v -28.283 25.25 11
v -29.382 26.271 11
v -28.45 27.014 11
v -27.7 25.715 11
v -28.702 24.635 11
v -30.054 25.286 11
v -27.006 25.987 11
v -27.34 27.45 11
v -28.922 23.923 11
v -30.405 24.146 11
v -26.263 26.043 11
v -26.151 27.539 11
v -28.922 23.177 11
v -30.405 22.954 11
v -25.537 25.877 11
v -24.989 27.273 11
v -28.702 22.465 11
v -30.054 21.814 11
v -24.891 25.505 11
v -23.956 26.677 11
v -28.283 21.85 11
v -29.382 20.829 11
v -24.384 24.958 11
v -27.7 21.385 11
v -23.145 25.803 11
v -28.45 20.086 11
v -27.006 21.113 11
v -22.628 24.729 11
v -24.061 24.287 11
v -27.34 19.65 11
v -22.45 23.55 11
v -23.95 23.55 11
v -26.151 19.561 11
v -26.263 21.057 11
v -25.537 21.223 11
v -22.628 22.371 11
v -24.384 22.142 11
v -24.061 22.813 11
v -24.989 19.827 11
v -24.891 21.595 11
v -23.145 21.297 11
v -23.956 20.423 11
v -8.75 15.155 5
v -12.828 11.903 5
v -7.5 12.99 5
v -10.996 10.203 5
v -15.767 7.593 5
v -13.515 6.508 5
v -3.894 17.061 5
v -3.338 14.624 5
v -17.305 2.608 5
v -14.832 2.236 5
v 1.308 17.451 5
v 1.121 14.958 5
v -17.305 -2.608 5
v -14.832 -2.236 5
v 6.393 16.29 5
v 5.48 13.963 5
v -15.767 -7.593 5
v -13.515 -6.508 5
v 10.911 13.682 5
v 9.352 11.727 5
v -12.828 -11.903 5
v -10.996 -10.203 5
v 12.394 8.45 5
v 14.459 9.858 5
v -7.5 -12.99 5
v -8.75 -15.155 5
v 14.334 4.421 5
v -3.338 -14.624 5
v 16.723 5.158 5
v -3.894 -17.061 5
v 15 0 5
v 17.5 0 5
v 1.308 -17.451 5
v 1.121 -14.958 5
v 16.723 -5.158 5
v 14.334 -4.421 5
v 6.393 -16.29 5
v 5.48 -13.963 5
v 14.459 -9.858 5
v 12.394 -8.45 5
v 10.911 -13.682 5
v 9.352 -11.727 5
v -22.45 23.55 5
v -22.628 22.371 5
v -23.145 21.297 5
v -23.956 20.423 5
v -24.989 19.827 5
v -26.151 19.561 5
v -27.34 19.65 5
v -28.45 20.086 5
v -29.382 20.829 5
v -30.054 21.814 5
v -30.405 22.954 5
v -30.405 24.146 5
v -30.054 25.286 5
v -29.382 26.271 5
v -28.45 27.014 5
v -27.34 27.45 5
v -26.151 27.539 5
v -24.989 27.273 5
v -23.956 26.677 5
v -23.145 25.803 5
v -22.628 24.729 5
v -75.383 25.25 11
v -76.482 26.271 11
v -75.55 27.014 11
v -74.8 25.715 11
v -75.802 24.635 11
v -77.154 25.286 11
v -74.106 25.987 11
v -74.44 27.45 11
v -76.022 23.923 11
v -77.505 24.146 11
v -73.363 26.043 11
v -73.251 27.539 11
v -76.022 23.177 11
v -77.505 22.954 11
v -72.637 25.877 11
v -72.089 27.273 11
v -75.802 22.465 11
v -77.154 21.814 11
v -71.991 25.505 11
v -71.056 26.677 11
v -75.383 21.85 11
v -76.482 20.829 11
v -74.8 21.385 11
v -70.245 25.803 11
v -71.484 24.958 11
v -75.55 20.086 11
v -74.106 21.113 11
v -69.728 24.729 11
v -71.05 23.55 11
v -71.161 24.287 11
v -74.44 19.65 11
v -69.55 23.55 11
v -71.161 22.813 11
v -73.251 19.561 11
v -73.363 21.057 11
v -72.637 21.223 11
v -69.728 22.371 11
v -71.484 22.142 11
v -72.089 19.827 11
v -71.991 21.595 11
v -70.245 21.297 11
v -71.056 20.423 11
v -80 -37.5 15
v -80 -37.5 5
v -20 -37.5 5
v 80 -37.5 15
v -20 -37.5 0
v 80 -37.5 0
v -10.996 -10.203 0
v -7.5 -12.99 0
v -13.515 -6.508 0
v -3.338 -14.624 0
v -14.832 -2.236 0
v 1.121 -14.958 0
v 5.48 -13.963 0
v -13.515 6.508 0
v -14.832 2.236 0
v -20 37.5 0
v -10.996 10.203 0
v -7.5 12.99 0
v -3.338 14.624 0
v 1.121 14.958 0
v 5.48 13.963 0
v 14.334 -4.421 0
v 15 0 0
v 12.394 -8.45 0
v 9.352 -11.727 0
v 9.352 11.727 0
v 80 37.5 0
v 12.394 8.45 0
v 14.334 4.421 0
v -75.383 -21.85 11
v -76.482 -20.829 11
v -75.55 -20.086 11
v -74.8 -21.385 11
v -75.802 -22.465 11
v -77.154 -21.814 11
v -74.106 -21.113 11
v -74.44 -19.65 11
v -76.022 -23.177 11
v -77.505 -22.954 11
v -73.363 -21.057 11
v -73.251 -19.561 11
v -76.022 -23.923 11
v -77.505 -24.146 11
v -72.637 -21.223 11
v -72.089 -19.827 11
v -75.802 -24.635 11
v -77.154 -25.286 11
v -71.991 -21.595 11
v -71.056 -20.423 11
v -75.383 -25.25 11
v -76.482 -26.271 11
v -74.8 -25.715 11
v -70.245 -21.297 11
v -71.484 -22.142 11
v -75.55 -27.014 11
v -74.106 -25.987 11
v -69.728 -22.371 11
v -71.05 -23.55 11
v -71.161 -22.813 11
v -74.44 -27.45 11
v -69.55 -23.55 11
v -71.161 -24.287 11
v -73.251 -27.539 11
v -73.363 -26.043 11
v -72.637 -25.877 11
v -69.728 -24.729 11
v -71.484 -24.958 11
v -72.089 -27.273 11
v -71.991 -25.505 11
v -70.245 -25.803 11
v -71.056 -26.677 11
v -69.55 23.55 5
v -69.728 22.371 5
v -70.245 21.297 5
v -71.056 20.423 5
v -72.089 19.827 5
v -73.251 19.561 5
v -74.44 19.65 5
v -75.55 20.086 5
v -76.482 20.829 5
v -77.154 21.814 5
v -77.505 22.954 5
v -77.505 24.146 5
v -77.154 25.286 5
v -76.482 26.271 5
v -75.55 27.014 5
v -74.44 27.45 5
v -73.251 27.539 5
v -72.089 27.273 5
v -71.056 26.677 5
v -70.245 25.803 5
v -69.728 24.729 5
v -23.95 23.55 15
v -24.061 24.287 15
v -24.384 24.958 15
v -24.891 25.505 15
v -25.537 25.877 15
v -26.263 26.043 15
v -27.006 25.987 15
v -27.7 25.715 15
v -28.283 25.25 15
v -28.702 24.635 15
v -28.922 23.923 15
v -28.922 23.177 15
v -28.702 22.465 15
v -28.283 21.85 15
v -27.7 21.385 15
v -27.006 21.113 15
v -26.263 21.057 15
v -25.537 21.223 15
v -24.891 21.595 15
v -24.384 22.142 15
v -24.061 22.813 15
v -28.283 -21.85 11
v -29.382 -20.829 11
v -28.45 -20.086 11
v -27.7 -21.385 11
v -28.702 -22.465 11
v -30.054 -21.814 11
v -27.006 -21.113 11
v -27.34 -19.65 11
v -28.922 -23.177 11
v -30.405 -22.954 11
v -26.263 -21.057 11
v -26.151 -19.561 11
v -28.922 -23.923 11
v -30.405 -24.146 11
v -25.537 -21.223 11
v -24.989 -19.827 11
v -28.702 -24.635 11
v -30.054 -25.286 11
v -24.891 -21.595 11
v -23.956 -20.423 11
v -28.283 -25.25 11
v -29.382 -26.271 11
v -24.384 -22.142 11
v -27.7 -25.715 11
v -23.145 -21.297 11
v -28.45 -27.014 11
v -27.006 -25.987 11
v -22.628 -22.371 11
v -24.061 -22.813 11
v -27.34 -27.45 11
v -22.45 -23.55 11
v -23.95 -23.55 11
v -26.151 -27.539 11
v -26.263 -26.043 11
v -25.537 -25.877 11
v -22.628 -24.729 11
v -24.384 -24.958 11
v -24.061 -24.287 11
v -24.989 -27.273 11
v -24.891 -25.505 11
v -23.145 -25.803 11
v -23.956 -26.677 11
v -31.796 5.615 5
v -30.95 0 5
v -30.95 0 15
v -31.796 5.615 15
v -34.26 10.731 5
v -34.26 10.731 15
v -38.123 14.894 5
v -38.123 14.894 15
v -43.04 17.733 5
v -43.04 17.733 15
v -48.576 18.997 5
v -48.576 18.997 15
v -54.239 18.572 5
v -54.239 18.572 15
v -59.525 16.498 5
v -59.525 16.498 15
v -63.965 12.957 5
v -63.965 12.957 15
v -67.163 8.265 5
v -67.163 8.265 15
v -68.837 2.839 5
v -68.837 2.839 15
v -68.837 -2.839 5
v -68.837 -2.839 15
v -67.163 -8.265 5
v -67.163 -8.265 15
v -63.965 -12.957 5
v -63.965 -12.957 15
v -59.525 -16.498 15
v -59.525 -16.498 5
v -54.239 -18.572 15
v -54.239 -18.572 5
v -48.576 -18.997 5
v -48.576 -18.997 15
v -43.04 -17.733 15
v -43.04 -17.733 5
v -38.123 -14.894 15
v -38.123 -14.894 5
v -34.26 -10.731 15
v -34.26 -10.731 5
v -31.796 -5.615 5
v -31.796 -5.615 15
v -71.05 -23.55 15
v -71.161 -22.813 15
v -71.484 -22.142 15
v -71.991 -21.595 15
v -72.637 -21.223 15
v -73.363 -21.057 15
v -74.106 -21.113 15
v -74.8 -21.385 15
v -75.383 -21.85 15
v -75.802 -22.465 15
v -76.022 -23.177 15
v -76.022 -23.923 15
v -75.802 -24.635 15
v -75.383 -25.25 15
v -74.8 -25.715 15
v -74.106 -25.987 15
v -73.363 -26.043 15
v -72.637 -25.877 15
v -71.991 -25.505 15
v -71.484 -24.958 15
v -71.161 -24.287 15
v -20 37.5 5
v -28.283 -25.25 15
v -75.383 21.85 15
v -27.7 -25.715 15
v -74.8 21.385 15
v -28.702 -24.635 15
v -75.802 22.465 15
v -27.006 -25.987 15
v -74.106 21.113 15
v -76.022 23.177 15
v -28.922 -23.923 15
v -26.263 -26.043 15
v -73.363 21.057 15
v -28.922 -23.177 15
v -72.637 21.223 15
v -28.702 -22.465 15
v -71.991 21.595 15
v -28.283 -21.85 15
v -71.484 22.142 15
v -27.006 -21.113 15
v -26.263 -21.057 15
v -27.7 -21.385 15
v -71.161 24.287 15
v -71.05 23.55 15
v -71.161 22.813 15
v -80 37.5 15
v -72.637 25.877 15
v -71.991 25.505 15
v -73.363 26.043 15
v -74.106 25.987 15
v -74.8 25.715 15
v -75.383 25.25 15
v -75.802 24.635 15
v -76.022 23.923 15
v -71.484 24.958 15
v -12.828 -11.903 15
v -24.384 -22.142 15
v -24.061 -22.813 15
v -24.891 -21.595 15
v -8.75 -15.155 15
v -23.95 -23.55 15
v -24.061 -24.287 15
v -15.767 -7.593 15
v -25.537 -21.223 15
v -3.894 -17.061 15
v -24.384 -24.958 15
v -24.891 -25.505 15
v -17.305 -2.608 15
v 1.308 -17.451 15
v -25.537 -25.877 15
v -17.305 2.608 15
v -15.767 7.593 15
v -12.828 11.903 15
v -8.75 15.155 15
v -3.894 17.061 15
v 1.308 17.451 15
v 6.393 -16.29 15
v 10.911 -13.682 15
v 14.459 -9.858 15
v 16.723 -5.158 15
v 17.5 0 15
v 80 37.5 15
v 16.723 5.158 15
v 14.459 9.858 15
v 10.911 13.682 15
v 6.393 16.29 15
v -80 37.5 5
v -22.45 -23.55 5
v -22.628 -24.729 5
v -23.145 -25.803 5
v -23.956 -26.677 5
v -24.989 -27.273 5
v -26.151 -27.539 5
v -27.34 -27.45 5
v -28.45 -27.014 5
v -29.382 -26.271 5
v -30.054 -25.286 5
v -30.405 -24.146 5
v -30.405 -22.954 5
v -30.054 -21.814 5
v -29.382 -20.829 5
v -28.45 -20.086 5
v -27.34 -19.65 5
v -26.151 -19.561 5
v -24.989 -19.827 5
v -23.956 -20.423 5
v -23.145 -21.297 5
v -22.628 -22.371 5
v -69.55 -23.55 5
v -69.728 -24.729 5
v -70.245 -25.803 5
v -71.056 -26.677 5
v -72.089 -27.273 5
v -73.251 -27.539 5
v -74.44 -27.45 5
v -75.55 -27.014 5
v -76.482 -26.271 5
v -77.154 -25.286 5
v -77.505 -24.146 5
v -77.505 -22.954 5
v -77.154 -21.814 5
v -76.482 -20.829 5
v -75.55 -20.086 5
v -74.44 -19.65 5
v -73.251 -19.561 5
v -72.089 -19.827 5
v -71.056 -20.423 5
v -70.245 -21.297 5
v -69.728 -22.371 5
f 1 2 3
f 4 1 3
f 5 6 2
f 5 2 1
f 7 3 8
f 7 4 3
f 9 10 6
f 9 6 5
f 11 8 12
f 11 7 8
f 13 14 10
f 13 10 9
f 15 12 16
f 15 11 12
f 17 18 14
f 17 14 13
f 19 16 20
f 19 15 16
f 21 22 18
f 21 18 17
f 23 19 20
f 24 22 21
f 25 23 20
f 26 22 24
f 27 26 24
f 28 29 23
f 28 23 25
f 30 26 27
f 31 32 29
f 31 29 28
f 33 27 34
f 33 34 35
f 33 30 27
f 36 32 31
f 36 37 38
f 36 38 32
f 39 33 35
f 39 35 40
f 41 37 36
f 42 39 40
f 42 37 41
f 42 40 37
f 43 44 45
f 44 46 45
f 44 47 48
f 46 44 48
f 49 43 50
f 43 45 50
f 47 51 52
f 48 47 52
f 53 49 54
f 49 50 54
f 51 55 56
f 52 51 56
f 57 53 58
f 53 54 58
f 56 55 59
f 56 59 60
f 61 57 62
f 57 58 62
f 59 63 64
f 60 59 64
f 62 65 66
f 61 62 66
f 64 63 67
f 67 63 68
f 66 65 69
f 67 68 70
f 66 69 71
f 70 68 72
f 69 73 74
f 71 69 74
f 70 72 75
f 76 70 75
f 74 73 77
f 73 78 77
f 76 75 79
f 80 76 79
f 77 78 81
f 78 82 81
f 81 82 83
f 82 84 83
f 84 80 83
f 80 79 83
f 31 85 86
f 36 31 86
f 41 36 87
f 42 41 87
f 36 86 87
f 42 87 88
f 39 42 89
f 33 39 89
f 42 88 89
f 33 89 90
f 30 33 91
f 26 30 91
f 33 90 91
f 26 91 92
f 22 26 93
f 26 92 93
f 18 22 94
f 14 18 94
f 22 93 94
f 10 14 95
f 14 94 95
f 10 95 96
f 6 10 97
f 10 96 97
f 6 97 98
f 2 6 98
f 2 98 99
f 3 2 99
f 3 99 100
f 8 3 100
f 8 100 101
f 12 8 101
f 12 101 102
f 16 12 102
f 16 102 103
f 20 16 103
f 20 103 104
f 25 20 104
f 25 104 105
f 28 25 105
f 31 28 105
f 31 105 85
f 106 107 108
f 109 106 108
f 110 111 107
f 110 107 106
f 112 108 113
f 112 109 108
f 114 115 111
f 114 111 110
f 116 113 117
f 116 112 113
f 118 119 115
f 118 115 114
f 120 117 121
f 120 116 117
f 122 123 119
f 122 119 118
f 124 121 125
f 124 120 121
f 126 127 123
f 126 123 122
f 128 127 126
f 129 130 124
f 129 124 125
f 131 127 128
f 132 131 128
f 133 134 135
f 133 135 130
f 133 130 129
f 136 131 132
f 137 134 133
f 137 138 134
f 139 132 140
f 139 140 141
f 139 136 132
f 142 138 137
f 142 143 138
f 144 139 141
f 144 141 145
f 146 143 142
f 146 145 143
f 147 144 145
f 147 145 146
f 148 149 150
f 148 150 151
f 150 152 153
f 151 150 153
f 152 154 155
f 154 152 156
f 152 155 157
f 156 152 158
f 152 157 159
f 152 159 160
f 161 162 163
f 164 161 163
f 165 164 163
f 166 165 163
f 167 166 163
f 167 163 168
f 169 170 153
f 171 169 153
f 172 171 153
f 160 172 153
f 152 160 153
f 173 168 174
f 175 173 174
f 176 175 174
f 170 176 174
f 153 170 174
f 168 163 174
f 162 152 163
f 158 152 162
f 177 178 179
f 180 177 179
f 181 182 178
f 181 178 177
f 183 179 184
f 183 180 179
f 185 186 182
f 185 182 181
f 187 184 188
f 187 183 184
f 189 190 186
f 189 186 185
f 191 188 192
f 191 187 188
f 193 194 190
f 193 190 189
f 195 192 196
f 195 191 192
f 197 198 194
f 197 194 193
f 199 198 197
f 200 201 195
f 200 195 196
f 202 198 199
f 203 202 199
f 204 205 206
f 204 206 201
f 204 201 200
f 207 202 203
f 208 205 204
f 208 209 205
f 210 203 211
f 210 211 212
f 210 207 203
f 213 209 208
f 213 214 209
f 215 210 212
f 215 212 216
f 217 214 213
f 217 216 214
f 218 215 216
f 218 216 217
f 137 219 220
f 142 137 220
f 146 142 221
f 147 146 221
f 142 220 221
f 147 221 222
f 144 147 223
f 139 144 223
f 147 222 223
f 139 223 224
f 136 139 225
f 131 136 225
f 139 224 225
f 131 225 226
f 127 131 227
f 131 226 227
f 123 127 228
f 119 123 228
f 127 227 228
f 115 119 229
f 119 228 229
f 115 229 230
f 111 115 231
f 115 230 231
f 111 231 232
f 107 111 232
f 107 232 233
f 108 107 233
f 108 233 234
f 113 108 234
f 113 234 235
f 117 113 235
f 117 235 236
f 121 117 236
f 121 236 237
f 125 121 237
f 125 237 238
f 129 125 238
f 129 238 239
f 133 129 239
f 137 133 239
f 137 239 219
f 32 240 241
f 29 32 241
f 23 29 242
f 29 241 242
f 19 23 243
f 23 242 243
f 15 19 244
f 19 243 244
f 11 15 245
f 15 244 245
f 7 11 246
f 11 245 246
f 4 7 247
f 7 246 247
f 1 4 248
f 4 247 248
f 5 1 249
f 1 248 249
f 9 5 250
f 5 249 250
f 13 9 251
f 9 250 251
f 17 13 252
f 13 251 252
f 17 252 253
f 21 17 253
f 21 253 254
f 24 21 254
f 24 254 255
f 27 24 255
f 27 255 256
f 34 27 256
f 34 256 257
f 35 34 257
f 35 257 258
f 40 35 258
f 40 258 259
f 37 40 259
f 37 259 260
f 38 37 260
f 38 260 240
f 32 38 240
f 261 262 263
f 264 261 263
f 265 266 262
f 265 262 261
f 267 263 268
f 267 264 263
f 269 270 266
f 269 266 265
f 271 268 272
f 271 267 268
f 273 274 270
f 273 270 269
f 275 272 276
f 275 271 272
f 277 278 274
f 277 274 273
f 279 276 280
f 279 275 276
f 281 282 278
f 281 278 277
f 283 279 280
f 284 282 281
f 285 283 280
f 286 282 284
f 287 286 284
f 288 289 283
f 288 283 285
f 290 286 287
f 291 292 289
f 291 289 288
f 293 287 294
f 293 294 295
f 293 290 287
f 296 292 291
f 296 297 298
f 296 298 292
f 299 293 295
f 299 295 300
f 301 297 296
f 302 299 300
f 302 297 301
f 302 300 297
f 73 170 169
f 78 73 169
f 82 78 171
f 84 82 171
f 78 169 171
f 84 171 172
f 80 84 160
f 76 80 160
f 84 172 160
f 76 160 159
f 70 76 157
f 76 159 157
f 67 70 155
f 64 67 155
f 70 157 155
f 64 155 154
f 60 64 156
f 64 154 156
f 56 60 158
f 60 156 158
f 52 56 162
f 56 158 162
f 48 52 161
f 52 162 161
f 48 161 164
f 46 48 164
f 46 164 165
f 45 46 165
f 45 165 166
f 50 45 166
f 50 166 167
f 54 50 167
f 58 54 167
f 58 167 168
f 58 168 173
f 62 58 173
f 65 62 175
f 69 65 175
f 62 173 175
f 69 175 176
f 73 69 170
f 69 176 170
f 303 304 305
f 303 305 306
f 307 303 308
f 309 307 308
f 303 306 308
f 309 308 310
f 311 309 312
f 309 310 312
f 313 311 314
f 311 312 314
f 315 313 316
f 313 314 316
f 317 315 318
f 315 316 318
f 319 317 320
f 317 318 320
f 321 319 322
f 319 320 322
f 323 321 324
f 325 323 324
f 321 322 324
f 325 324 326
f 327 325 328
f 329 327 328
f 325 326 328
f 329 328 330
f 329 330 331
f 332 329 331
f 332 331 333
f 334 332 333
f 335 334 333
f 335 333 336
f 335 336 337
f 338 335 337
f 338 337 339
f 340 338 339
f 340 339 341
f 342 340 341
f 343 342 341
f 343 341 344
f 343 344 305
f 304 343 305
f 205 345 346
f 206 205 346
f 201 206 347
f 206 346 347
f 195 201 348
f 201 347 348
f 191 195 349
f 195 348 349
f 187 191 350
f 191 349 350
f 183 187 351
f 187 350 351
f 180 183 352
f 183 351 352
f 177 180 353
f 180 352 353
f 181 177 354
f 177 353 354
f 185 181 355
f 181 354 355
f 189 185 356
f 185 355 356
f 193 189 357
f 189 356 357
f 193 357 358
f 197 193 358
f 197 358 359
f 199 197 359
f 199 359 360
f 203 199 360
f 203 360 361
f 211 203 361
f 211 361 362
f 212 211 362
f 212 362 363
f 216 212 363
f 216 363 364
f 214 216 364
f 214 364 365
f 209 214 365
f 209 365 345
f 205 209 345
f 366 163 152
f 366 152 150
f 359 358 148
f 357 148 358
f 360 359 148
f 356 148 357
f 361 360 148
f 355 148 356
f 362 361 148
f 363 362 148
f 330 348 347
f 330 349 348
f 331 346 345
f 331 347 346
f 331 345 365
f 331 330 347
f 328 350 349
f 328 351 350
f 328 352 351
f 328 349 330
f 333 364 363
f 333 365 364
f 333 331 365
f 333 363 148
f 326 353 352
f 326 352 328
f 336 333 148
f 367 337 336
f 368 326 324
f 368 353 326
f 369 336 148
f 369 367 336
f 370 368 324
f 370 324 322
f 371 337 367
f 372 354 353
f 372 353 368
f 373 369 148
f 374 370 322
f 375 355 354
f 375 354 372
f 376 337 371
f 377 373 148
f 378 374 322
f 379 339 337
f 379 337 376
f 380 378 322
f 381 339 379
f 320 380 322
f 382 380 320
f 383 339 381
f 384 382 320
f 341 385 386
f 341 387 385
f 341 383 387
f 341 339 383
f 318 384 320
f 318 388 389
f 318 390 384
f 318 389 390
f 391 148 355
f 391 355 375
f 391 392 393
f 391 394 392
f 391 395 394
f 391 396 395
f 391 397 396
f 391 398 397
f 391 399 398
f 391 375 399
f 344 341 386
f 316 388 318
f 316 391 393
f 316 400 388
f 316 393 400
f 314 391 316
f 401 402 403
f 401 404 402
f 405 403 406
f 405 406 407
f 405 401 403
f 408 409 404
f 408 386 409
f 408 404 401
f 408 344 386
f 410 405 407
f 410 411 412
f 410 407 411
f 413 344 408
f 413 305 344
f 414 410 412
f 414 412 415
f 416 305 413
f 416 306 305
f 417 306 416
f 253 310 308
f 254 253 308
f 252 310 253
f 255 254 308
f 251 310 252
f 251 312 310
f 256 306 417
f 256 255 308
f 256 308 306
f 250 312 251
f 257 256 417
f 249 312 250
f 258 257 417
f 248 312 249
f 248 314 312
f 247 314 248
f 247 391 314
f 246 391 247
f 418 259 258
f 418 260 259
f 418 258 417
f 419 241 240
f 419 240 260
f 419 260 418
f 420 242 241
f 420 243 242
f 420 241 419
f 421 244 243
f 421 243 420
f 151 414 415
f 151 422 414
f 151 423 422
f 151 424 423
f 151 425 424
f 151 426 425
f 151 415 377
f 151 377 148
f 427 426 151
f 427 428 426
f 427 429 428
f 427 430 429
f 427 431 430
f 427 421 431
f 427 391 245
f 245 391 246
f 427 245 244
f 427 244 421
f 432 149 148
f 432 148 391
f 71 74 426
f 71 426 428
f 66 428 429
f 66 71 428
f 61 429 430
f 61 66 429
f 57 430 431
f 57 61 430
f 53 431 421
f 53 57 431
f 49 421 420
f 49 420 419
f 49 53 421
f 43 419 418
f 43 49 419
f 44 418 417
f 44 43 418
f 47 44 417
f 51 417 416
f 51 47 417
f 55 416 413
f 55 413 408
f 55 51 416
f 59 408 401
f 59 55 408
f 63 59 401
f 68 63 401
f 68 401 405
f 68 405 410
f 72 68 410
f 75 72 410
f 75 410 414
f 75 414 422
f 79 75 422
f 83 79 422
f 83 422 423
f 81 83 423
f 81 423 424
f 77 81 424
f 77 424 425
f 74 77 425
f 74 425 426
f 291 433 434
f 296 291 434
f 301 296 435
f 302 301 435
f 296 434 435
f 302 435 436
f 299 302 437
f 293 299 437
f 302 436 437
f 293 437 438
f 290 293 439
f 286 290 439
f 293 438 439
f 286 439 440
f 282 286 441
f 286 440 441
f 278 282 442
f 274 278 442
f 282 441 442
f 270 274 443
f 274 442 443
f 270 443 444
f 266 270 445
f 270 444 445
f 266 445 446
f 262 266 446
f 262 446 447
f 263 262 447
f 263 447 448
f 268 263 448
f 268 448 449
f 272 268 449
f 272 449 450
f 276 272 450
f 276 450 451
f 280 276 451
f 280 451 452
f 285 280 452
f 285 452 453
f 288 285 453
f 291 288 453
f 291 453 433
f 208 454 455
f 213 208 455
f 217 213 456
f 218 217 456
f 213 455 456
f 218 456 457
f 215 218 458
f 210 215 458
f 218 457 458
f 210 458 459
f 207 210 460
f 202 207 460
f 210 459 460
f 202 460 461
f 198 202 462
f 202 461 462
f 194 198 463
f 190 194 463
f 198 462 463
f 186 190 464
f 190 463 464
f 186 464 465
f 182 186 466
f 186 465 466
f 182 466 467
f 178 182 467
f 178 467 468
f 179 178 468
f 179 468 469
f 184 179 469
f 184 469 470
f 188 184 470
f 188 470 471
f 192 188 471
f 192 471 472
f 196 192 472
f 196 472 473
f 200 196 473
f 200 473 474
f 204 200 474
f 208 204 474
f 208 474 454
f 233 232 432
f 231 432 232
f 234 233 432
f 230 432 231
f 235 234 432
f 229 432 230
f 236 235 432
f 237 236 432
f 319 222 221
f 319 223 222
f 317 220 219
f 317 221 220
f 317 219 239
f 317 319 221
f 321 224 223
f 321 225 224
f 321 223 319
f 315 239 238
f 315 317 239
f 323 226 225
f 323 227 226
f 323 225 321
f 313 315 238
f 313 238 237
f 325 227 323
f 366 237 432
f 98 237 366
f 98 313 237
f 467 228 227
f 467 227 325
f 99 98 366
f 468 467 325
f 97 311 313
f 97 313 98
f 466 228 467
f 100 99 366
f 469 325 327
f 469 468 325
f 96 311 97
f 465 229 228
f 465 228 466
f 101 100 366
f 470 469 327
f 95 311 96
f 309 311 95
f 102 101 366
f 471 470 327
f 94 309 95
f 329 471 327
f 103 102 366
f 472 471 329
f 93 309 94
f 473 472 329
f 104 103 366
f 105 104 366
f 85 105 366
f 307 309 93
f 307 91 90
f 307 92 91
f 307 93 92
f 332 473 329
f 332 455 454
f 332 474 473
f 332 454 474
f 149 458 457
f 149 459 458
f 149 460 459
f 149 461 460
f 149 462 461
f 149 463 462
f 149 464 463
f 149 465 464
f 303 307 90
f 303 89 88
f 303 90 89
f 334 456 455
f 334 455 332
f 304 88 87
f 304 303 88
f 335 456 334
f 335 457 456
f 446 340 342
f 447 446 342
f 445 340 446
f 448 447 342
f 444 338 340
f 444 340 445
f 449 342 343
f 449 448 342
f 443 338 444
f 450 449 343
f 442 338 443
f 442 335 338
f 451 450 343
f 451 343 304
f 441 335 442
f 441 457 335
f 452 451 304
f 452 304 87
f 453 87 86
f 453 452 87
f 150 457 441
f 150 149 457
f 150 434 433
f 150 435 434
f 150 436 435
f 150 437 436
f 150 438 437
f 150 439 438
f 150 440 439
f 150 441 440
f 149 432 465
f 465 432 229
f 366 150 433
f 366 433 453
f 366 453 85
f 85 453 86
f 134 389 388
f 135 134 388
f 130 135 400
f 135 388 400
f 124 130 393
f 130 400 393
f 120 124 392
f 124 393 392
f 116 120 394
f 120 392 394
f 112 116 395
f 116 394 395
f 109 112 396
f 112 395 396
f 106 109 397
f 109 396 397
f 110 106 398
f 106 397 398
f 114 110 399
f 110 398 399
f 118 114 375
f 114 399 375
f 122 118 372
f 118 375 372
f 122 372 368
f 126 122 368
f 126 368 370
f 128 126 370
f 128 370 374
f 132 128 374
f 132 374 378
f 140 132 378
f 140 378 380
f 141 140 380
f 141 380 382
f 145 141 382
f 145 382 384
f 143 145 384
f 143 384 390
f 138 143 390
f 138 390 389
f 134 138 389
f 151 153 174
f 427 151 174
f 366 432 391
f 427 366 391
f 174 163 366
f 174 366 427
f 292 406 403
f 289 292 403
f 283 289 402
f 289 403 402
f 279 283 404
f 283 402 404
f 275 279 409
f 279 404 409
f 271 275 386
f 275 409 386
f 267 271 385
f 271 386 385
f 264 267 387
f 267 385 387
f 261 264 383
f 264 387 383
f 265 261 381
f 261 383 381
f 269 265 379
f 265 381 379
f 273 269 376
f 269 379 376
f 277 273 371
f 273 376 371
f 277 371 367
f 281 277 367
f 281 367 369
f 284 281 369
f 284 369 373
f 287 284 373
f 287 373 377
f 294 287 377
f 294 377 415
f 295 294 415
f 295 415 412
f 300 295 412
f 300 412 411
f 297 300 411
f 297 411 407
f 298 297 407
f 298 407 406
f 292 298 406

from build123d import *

# Parameters (mm, degrees)
F0_W     = 160
F0_H     = 75
F0_R     = 17.5
F1_DEPTH = 15
F2_R     = 2.5
F2_R_2   = 19.05
F3_DEPTH = 25
F4_R     = 4
F5_DEPTH = 11
F6_W     = 60
F6_H     = 5
F7_DEPTH = 79.7
F8_R     = 19
F8_R_2   = 17.5
F8_R_3   = 15
F9_DEPTH = 5


# Not quite as in the source:
# - a feature names something its author has since deleted; it is built from what else it names


with BuildPart() as f1:
    # F0 (on Top) → F1 (new body)
    with BuildSketch(Plane.XY):
        Rectangle(F0_W, F0_H)
        Circle(F0_R, mode=Mode.SUBTRACT)
    extrude(amount=F1_DEPTH)

    # F2 (on face) → F3 (cut)
    with BuildSketch(Plane.XY.offset(15)):
        with Locations((-73.55, 23.55)):
            Circle(F2_R)
        with Locations((-26.45, 23.55)):
            Circle(F2_R)
        with Locations((-26.45, -23.55)):
            Circle(F2_R)
        with Locations((-73.55, -23.55)):
            Circle(F2_R)
        with Locations((-50, 0)):
            Circle(F2_R_2)
    extrude(amount=-F3_DEPTH, mode=Mode.SUBTRACT)

    # F4 (on face) → F5 (cut)
    with BuildSketch(Plane(origin=(0, 0, 0), x_dir=(1, 0, 0), z_dir=(0, 0, -1))):
        with Locations((-73.55, 23.55)):
            Circle(F4_R)
        with Locations((-26.45, 23.55)):
            Circle(F4_R)
        with Locations((-26.45, -23.55)):
            Circle(F4_R)
        with Locations((-73.55, -23.55)):
            Circle(F4_R)
    extrude(amount=-F5_DEPTH, mode=Mode.SUBTRACT)

    # F6 (on face) → F7 (cut)
    with BuildSketch(Plane.XZ.offset(37.5)):
        with Locations((-50, 2.5)):
            Rectangle(F6_W, F6_H)
    extrude(amount=-F7_DEPTH, mode=Mode.SUBTRACT)

    # F8 (on face) → F9 (join)
    with BuildSketch(Plane(origin=(0, 0, 0), x_dir=(1, 0, 0), z_dir=(0, 0, -1))):
        Circle(F8_R)
        Circle(F8_R_2, mode=Mode.SUBTRACT)
        Circle(F8_R_2)
        Circle(F8_R_3, mode=Mode.SUBTRACT)
    extrude(amount=-F9_DEPTH)


solid = f1.part
